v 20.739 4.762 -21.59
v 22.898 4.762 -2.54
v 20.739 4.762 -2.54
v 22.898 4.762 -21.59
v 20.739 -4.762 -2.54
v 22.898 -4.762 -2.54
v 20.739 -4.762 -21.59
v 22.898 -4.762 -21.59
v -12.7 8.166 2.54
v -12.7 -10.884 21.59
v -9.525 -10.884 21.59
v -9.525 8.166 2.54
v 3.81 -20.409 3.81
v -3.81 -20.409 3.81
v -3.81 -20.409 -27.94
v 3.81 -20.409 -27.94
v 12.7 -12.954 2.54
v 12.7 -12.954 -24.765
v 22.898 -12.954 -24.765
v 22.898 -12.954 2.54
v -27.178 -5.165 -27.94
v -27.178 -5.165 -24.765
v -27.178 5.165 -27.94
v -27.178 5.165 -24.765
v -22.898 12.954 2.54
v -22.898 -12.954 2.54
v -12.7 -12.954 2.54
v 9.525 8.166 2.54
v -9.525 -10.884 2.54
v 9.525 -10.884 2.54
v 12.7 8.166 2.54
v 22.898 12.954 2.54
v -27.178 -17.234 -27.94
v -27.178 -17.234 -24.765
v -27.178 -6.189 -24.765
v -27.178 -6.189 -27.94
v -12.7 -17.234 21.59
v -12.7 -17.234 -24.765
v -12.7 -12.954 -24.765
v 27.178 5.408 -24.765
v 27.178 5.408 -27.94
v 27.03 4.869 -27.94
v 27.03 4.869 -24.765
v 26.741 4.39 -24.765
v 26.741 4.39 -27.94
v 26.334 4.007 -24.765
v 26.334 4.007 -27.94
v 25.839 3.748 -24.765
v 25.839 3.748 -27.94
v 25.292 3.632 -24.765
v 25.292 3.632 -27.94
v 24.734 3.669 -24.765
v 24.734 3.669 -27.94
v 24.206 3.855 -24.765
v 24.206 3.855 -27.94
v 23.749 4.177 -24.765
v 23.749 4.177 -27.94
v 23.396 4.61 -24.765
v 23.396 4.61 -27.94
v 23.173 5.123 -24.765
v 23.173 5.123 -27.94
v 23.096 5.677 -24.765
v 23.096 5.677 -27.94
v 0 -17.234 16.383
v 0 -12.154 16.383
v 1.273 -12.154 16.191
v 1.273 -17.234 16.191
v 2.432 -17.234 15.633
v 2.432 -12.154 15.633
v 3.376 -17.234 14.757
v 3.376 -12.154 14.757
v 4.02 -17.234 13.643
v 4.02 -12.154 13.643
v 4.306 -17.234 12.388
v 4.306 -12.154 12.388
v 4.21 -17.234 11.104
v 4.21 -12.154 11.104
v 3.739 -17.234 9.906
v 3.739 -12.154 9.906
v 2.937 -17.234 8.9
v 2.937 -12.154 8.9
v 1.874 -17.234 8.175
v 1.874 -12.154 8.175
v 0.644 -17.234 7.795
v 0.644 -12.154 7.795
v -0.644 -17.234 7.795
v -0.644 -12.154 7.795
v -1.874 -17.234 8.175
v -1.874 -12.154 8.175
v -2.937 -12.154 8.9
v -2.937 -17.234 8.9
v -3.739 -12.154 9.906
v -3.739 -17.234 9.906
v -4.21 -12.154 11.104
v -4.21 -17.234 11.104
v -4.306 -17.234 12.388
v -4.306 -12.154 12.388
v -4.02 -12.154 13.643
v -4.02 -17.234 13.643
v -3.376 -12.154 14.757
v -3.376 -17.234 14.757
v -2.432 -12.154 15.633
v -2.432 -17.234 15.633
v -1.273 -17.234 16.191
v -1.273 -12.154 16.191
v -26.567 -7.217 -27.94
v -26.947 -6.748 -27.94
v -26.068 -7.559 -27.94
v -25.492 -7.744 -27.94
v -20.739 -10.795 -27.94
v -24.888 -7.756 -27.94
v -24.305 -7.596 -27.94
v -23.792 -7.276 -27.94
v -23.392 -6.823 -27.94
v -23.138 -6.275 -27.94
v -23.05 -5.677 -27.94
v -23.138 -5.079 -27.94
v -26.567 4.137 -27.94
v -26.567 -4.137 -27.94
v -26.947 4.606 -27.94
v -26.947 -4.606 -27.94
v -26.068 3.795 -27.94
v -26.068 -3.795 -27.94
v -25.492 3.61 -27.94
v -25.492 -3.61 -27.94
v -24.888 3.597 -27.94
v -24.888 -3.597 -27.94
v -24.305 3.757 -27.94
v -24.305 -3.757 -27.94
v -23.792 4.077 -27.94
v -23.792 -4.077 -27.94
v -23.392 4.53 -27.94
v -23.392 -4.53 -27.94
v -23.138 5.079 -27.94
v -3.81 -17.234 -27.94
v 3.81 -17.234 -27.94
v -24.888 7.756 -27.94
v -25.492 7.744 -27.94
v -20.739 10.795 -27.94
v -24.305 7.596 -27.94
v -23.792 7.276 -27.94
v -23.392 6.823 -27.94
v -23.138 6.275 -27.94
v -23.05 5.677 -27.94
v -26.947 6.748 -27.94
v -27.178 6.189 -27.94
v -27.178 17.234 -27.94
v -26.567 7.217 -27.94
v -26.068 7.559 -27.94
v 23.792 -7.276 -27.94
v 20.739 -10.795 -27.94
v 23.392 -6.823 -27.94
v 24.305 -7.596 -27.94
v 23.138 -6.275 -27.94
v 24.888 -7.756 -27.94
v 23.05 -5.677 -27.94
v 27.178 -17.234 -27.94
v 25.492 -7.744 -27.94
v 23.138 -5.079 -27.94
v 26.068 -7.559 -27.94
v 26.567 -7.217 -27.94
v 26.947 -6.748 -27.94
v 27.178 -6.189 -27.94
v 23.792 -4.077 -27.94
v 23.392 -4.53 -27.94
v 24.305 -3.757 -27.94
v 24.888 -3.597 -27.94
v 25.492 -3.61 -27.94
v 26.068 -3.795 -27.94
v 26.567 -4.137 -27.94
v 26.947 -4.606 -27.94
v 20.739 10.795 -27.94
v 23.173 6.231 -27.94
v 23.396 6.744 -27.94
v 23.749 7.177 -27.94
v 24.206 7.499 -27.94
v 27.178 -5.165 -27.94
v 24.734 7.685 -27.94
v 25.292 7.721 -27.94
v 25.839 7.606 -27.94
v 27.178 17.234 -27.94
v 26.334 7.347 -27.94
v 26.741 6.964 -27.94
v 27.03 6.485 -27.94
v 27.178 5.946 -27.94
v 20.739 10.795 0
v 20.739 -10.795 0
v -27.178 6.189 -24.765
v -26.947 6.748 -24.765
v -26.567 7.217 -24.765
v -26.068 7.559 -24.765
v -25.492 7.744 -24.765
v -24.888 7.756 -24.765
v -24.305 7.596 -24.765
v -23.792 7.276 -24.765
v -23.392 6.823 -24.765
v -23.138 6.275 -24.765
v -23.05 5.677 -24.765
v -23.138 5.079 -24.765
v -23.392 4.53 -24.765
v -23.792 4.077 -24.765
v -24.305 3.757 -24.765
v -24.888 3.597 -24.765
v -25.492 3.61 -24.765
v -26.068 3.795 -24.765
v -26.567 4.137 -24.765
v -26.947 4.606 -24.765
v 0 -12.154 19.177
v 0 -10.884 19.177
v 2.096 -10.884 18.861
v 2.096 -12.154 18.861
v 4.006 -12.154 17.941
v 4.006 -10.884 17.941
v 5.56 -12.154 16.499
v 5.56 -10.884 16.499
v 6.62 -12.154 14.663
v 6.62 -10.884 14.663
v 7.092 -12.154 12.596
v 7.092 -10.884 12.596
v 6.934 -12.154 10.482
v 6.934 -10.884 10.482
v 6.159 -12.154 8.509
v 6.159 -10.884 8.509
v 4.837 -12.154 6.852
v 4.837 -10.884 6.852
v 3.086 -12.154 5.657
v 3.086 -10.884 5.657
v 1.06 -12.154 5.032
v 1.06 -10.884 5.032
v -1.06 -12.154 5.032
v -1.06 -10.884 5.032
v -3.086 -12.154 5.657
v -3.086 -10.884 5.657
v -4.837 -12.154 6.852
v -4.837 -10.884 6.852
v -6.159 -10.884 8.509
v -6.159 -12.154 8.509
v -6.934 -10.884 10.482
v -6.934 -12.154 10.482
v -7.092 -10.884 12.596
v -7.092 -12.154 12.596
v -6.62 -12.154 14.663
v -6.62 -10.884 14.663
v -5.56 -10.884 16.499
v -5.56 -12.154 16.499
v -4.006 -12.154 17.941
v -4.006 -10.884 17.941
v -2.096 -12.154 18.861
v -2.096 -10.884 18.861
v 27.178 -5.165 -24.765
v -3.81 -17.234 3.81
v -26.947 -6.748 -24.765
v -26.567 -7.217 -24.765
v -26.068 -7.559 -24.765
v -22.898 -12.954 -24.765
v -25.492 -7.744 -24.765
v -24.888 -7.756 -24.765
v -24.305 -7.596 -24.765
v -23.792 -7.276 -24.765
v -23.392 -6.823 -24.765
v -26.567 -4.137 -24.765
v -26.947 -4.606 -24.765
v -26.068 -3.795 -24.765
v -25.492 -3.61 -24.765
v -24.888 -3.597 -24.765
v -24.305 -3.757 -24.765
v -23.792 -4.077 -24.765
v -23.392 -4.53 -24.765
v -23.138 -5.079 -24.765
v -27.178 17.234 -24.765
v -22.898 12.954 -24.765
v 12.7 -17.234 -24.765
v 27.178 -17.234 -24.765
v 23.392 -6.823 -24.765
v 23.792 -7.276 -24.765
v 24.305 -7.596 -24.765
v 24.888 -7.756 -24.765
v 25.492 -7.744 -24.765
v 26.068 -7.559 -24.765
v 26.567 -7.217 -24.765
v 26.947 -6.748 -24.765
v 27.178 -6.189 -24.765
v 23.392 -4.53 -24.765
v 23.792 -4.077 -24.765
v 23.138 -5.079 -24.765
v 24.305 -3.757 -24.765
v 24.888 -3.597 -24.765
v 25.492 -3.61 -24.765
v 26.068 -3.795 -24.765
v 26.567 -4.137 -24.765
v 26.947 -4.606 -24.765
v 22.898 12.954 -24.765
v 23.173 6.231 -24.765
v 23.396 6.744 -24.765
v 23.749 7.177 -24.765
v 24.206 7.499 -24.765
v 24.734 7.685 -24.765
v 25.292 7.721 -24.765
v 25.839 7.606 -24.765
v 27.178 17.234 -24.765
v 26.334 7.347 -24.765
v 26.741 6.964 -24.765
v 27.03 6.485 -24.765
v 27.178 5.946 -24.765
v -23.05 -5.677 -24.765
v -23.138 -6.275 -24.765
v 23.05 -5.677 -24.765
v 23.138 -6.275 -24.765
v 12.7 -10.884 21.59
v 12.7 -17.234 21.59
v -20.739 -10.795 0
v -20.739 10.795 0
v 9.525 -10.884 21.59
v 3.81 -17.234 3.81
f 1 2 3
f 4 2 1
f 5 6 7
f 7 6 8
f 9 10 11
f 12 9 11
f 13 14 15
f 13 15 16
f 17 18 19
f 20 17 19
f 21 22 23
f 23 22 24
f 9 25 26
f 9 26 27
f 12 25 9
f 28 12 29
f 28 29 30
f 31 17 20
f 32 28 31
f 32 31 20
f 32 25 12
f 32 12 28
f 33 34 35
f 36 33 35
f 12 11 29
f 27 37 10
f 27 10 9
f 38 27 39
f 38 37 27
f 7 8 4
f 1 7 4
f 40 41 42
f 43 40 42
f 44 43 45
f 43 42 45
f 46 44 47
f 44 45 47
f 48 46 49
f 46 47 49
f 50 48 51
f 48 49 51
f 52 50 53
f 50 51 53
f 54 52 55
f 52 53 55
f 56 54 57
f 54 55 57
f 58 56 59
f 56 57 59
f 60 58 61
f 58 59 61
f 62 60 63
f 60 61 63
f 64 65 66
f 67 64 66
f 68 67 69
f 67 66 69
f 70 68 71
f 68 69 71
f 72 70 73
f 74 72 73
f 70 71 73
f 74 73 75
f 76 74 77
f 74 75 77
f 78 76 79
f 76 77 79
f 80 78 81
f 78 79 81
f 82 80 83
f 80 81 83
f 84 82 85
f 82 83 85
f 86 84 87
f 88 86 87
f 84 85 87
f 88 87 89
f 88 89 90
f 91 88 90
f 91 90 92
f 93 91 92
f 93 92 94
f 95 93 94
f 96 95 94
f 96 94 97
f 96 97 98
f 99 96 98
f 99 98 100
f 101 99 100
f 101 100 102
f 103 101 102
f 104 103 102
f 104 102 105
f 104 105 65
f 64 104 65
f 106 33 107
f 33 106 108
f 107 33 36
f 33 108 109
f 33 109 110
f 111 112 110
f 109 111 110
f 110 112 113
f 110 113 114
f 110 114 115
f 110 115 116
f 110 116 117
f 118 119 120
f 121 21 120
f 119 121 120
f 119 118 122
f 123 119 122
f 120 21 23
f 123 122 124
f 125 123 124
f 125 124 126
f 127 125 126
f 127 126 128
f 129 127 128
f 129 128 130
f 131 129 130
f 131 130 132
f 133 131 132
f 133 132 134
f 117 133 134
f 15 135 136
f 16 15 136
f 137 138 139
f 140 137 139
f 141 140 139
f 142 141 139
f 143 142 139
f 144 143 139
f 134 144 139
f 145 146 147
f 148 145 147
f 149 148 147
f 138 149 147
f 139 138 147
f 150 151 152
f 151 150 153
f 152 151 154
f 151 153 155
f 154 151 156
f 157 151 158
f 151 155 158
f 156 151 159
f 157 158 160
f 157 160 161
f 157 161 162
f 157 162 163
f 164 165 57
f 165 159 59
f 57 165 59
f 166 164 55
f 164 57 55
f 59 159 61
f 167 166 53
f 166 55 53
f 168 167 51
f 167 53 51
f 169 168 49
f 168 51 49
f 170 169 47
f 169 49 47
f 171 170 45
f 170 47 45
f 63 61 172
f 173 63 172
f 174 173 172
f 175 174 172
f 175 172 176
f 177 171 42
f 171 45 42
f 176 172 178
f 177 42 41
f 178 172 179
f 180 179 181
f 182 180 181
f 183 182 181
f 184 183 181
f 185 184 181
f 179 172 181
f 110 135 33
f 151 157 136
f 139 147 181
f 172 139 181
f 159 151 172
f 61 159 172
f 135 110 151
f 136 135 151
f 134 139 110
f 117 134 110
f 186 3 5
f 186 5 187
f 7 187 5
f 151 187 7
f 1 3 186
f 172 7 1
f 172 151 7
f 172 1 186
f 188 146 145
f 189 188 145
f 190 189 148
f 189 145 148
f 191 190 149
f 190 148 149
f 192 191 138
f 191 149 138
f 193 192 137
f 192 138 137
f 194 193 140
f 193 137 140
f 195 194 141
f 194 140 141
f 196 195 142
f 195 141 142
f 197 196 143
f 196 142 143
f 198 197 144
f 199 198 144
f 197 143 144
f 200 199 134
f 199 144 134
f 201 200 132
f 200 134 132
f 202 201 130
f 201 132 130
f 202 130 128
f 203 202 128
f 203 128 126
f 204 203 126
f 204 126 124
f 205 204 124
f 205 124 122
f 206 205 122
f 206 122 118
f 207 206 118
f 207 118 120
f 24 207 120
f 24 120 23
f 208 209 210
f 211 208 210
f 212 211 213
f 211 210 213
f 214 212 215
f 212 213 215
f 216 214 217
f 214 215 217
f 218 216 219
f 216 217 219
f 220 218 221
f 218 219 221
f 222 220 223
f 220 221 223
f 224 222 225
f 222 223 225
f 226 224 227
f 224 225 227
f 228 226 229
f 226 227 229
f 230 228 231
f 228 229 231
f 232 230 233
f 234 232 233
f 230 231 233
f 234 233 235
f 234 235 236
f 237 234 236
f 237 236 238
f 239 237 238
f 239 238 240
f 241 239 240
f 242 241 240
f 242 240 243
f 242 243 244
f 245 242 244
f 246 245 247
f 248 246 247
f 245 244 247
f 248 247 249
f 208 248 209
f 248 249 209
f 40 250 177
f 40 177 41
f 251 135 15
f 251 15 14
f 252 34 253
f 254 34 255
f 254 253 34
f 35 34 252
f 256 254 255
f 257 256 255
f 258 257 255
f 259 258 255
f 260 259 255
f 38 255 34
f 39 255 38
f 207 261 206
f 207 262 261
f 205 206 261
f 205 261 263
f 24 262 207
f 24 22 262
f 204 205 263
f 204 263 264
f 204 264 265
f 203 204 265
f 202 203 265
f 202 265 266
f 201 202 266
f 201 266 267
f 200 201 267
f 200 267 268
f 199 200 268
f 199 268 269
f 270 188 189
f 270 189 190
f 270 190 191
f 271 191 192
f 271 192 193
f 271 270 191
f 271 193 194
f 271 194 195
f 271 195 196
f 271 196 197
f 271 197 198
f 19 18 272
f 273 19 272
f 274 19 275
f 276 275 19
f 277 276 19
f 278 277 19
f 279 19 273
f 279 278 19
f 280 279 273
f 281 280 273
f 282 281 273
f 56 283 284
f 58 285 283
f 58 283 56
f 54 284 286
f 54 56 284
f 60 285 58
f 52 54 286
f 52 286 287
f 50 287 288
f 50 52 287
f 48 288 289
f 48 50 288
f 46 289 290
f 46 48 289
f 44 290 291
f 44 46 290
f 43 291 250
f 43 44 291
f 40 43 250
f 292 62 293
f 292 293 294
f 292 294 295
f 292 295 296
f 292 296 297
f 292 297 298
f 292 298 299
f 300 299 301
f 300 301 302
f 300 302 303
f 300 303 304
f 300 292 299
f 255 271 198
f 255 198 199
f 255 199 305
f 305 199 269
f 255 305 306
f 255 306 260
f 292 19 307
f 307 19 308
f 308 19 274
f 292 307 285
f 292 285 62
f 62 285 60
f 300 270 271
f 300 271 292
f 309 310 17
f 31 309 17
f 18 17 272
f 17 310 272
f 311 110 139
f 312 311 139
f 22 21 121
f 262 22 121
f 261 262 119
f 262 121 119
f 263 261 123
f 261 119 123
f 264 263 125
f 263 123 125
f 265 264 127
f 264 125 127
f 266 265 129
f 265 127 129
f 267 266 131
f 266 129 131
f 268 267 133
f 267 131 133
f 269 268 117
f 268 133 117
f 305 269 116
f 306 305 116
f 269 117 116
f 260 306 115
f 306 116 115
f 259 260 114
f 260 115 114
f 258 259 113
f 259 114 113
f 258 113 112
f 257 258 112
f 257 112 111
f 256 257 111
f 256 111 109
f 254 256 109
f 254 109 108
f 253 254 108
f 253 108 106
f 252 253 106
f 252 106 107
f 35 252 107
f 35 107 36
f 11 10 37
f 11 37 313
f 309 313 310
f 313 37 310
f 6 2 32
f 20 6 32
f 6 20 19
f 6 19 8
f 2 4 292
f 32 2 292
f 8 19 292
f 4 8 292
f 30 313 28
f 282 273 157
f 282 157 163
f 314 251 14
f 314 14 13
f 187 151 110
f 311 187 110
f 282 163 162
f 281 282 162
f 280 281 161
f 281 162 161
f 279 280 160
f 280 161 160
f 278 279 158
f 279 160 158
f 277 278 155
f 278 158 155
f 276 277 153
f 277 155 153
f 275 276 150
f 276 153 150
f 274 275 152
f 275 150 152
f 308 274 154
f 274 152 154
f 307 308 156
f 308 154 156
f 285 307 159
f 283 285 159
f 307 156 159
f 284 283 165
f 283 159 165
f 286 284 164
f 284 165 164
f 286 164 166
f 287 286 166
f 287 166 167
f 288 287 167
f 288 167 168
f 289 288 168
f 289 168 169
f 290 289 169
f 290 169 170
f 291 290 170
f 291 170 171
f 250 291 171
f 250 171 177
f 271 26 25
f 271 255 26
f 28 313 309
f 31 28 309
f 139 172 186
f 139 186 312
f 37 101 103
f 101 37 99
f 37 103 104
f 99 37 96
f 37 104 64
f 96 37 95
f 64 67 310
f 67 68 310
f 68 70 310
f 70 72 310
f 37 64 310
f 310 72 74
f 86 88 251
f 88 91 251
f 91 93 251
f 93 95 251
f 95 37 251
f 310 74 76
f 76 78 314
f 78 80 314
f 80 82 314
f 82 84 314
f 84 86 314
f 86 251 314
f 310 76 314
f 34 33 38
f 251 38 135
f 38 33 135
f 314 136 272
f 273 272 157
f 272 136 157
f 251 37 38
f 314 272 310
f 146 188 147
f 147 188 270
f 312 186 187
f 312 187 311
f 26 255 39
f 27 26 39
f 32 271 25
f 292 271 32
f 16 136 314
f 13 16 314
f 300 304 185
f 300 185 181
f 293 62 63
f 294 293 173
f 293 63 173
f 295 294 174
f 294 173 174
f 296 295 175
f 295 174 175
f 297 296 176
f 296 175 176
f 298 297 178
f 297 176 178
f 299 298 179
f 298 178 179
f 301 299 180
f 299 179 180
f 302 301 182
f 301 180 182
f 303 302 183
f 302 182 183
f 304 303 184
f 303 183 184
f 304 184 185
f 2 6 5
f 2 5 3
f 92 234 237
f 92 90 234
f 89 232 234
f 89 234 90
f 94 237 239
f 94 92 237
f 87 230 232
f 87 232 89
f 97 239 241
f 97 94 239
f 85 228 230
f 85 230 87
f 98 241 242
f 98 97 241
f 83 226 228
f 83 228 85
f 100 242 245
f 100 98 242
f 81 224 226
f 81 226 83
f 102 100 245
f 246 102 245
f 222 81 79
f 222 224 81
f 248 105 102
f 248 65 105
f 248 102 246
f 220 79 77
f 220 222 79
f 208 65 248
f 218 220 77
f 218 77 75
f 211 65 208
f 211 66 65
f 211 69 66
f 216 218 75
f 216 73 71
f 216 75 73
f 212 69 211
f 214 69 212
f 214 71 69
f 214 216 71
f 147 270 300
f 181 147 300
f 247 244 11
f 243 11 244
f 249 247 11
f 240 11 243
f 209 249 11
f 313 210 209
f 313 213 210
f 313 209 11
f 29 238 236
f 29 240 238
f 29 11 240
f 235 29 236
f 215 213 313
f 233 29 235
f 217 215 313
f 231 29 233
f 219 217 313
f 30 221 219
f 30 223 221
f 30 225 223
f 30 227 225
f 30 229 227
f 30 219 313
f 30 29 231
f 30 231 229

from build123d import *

# Parameters (mm, degrees)
SKETCH1_W           = 54.356
SKETCH1_H           = 34.4678
SKETCH1_W_2         = 40.2082
SKETCH1_H_2         = 20.32
BOSS_EXTRUDE1_DEPTH = 27.94
SKETCH2_W           = 54.356
SKETCH2_H           = 34.4678
SKETCH2_W_2         = 45.7962
SKETCH2_H_2         = 25.908
CUT_EXTRUDE1_DEPTH  = 24.765
SKETCH3_R           = 2.04968225
SKETCH3_R_2         = 2.0955
CUT_EXTRUDE2_DEPTH  = 43.618007851
SKETCH4_W           = 19.05
SKETCH4_H           = 9.525
CUT_EXTRUDE3_DEPTH  = 12.7
SKETCH5_W           = 45.7962
SKETCH5_H           = 25.908
BOSS_EXTRUDE2_DEPTH = 2.54
SKETCH6_W           = 25.4
SKETCH6_H           = 4.2799
BOSS_EXTRUDE3_DEPTH = 27.305
SKETCH7_W           = 25.4
SKETCH7_H           = 6.35
BOSS_EXTRUDE4_DEPTH = 19.05
SKETCH8_R           = 4.318
CUT_EXTRUDE4_DEPTH  = 19.05
SKETCH9_R           = 7.112
CUT_EXTRUDE5_DEPTH  = 1.27
SKETCH10_W          = 3.175
SKETCH10_H          = 19.05
BOSS_EXTRUDE5_DEPTH = 19.05
CHAMFER1_SIZE       = 19.05
SKETCH12_W          = 7.62
SKETCH12_H          = 31.75
BOSS_EXTRUDE6_DEPTH = 3.175
SKETCH13_W          = 41.4782
SKETCH13_H          = 21.59
CUT_EXTRUDE7_DEPTH  = 27.94


with BuildPart() as part:
    # Sketch1 → Boss-Extrude1 (new body)
    with BuildSketch(Plane.XY):
        Rectangle(SKETCH1_W, SKETCH1_H)
        Rectangle(SKETCH1_W_2, SKETCH1_H_2, mode=Mode.SUBTRACT)
    extrude(amount=-BOSS_EXTRUDE1_DEPTH)

    # Sketch2 → Cut-Extrude1 (cut)
    with BuildSketch(Plane.XY):
        Rectangle(SKETCH2_W, SKETCH2_H)
        Rectangle(SKETCH2_W_2, SKETCH2_H_2, mode=Mode.SUBTRACT)
    extrude(amount=-CUT_EXTRUDE1_DEPTH, mode=Mode.SUBTRACT)

    # Sketch3 → Cut-Extrude2 (cut, through all)
    with BuildSketch(Plane(origin=(0, 0, -27.94), x_dir=(-1, 0, 0), z_dir=(0, 0, -1))):
        with Locations((-25.146, 5.6769)):
            Circle(SKETCH3_R)
        with Locations((-25.146, -5.6769)):
            Circle(SKETCH3_R_2)
        with Locations((25.146, -5.6769)):
            Circle(SKETCH3_R_2)
        with Locations((25.146, 5.6769)):
            Circle(SKETCH3_R_2)
    extrude(amount=-CUT_EXTRUDE2_DEPTH, mode=Mode.SUBTRACT)

    # Sketch4 → Cut-Extrude3 (cut)
    with BuildSketch(Plane(origin=(22.8981, 0, 0), x_dir=(0, 0, -1), z_dir=(1, 0, 0))):
        with Locations((12.065, 0)):
            Rectangle(SKETCH4_W, SKETCH4_H)
    extrude(amount=-CUT_EXTRUDE3_DEPTH, mode=Mode.SUBTRACT)

    # Sketch5 → Boss-Extrude2 (add)
    with BuildSketch(Plane.XY):
        Rectangle(SKETCH5_W, SKETCH5_H)
    extrude(amount=BOSS_EXTRUDE2_DEPTH)

    # Sketch6 → Boss-Extrude3 (add)
    with BuildSketch(Plane.XY.offset(2.54)):
        with Locations((0, -15.09395)):
            Rectangle(SKETCH6_W, SKETCH6_H)
    extrude(amount=-BOSS_EXTRUDE3_DEPTH)

    # Sketch7 → Boss-Extrude4 (add)
    with BuildSketch(Plane.XY.offset(2.54)):
        with Locations((0, -14.0589)):
            Rectangle(SKETCH7_W, SKETCH7_H)
    extrude(amount=BOSS_EXTRUDE4_DEPTH)

    # Sketch8 → Cut-Extrude4 (cut)
    with BuildSketch(Plane(origin=(0, -10.8839, 0), x_dir=(1, 0, 0), z_dir=(0, 1, 0))):
        with Locations(Location((0, -12.065, 0), (0, 0, 270))):
            Circle(SKETCH8_R)
    extrude(amount=-CUT_EXTRUDE4_DEPTH, mode=Mode.SUBTRACT)

    # Sketch9 → Cut-Extrude5 (cut)
    with BuildSketch(Plane(origin=(0, -10.8839, 0), x_dir=(1, 0, 0), z_dir=(0, 1, 0))):
        with Locations(Location((0, -12.065, 0), (0, 0, 270))):
            Circle(SKETCH9_R)
    extrude(amount=-CUT_EXTRUDE5_DEPTH, mode=Mode.SUBTRACT)

    # Sketch10 → Boss-Extrude5 (add)
    with BuildSketch(Plane(origin=(0, -10.8839, 0), x_dir=(1, 0, 0), z_dir=(0, 1, 0))):
        with Locations((11.1125, -12.065)):
            Rectangle(SKETCH10_W, SKETCH10_H)
        with Locations((-11.1125, -12.065)):
            Rectangle(SKETCH10_W, SKETCH10_H)
    extrude(amount=BOSS_EXTRUDE5_DEPTH)

    # Chamfer1
    chamfer1_edges = [part.edges().sort_by_distance(p)[0] for p in [
        (-11.1125, 8.1661, 21.59),
        (11.1125, 8.1661, 21.59),
    ]]
    chamfer(chamfer1_edges, length=CHAMFER1_SIZE - 0.0001)  # a hair under: the kernel refuses the full size

    # Sketch12 → Boss-Extrude6 (add)
    with BuildSketch(Plane.XZ.offset(17.2339)):
        with Locations((0, -12.065)):
            Rectangle(SKETCH12_W, SKETCH12_H)
    extrude(amount=BOSS_EXTRUDE6_DEPTH)

    # Sketch13 → Cut-Extrude7 (cut)
    with BuildSketch(Plane(origin=(0, 0, -27.94), x_dir=(-1, 0, 0), z_dir=(0, 0, -1))):
        Rectangle(SKETCH13_W, SKETCH13_H)
    extrude(amount=-CUT_EXTRUDE7_DEPTH, mode=Mode.SUBTRACT)


solid = part.part
